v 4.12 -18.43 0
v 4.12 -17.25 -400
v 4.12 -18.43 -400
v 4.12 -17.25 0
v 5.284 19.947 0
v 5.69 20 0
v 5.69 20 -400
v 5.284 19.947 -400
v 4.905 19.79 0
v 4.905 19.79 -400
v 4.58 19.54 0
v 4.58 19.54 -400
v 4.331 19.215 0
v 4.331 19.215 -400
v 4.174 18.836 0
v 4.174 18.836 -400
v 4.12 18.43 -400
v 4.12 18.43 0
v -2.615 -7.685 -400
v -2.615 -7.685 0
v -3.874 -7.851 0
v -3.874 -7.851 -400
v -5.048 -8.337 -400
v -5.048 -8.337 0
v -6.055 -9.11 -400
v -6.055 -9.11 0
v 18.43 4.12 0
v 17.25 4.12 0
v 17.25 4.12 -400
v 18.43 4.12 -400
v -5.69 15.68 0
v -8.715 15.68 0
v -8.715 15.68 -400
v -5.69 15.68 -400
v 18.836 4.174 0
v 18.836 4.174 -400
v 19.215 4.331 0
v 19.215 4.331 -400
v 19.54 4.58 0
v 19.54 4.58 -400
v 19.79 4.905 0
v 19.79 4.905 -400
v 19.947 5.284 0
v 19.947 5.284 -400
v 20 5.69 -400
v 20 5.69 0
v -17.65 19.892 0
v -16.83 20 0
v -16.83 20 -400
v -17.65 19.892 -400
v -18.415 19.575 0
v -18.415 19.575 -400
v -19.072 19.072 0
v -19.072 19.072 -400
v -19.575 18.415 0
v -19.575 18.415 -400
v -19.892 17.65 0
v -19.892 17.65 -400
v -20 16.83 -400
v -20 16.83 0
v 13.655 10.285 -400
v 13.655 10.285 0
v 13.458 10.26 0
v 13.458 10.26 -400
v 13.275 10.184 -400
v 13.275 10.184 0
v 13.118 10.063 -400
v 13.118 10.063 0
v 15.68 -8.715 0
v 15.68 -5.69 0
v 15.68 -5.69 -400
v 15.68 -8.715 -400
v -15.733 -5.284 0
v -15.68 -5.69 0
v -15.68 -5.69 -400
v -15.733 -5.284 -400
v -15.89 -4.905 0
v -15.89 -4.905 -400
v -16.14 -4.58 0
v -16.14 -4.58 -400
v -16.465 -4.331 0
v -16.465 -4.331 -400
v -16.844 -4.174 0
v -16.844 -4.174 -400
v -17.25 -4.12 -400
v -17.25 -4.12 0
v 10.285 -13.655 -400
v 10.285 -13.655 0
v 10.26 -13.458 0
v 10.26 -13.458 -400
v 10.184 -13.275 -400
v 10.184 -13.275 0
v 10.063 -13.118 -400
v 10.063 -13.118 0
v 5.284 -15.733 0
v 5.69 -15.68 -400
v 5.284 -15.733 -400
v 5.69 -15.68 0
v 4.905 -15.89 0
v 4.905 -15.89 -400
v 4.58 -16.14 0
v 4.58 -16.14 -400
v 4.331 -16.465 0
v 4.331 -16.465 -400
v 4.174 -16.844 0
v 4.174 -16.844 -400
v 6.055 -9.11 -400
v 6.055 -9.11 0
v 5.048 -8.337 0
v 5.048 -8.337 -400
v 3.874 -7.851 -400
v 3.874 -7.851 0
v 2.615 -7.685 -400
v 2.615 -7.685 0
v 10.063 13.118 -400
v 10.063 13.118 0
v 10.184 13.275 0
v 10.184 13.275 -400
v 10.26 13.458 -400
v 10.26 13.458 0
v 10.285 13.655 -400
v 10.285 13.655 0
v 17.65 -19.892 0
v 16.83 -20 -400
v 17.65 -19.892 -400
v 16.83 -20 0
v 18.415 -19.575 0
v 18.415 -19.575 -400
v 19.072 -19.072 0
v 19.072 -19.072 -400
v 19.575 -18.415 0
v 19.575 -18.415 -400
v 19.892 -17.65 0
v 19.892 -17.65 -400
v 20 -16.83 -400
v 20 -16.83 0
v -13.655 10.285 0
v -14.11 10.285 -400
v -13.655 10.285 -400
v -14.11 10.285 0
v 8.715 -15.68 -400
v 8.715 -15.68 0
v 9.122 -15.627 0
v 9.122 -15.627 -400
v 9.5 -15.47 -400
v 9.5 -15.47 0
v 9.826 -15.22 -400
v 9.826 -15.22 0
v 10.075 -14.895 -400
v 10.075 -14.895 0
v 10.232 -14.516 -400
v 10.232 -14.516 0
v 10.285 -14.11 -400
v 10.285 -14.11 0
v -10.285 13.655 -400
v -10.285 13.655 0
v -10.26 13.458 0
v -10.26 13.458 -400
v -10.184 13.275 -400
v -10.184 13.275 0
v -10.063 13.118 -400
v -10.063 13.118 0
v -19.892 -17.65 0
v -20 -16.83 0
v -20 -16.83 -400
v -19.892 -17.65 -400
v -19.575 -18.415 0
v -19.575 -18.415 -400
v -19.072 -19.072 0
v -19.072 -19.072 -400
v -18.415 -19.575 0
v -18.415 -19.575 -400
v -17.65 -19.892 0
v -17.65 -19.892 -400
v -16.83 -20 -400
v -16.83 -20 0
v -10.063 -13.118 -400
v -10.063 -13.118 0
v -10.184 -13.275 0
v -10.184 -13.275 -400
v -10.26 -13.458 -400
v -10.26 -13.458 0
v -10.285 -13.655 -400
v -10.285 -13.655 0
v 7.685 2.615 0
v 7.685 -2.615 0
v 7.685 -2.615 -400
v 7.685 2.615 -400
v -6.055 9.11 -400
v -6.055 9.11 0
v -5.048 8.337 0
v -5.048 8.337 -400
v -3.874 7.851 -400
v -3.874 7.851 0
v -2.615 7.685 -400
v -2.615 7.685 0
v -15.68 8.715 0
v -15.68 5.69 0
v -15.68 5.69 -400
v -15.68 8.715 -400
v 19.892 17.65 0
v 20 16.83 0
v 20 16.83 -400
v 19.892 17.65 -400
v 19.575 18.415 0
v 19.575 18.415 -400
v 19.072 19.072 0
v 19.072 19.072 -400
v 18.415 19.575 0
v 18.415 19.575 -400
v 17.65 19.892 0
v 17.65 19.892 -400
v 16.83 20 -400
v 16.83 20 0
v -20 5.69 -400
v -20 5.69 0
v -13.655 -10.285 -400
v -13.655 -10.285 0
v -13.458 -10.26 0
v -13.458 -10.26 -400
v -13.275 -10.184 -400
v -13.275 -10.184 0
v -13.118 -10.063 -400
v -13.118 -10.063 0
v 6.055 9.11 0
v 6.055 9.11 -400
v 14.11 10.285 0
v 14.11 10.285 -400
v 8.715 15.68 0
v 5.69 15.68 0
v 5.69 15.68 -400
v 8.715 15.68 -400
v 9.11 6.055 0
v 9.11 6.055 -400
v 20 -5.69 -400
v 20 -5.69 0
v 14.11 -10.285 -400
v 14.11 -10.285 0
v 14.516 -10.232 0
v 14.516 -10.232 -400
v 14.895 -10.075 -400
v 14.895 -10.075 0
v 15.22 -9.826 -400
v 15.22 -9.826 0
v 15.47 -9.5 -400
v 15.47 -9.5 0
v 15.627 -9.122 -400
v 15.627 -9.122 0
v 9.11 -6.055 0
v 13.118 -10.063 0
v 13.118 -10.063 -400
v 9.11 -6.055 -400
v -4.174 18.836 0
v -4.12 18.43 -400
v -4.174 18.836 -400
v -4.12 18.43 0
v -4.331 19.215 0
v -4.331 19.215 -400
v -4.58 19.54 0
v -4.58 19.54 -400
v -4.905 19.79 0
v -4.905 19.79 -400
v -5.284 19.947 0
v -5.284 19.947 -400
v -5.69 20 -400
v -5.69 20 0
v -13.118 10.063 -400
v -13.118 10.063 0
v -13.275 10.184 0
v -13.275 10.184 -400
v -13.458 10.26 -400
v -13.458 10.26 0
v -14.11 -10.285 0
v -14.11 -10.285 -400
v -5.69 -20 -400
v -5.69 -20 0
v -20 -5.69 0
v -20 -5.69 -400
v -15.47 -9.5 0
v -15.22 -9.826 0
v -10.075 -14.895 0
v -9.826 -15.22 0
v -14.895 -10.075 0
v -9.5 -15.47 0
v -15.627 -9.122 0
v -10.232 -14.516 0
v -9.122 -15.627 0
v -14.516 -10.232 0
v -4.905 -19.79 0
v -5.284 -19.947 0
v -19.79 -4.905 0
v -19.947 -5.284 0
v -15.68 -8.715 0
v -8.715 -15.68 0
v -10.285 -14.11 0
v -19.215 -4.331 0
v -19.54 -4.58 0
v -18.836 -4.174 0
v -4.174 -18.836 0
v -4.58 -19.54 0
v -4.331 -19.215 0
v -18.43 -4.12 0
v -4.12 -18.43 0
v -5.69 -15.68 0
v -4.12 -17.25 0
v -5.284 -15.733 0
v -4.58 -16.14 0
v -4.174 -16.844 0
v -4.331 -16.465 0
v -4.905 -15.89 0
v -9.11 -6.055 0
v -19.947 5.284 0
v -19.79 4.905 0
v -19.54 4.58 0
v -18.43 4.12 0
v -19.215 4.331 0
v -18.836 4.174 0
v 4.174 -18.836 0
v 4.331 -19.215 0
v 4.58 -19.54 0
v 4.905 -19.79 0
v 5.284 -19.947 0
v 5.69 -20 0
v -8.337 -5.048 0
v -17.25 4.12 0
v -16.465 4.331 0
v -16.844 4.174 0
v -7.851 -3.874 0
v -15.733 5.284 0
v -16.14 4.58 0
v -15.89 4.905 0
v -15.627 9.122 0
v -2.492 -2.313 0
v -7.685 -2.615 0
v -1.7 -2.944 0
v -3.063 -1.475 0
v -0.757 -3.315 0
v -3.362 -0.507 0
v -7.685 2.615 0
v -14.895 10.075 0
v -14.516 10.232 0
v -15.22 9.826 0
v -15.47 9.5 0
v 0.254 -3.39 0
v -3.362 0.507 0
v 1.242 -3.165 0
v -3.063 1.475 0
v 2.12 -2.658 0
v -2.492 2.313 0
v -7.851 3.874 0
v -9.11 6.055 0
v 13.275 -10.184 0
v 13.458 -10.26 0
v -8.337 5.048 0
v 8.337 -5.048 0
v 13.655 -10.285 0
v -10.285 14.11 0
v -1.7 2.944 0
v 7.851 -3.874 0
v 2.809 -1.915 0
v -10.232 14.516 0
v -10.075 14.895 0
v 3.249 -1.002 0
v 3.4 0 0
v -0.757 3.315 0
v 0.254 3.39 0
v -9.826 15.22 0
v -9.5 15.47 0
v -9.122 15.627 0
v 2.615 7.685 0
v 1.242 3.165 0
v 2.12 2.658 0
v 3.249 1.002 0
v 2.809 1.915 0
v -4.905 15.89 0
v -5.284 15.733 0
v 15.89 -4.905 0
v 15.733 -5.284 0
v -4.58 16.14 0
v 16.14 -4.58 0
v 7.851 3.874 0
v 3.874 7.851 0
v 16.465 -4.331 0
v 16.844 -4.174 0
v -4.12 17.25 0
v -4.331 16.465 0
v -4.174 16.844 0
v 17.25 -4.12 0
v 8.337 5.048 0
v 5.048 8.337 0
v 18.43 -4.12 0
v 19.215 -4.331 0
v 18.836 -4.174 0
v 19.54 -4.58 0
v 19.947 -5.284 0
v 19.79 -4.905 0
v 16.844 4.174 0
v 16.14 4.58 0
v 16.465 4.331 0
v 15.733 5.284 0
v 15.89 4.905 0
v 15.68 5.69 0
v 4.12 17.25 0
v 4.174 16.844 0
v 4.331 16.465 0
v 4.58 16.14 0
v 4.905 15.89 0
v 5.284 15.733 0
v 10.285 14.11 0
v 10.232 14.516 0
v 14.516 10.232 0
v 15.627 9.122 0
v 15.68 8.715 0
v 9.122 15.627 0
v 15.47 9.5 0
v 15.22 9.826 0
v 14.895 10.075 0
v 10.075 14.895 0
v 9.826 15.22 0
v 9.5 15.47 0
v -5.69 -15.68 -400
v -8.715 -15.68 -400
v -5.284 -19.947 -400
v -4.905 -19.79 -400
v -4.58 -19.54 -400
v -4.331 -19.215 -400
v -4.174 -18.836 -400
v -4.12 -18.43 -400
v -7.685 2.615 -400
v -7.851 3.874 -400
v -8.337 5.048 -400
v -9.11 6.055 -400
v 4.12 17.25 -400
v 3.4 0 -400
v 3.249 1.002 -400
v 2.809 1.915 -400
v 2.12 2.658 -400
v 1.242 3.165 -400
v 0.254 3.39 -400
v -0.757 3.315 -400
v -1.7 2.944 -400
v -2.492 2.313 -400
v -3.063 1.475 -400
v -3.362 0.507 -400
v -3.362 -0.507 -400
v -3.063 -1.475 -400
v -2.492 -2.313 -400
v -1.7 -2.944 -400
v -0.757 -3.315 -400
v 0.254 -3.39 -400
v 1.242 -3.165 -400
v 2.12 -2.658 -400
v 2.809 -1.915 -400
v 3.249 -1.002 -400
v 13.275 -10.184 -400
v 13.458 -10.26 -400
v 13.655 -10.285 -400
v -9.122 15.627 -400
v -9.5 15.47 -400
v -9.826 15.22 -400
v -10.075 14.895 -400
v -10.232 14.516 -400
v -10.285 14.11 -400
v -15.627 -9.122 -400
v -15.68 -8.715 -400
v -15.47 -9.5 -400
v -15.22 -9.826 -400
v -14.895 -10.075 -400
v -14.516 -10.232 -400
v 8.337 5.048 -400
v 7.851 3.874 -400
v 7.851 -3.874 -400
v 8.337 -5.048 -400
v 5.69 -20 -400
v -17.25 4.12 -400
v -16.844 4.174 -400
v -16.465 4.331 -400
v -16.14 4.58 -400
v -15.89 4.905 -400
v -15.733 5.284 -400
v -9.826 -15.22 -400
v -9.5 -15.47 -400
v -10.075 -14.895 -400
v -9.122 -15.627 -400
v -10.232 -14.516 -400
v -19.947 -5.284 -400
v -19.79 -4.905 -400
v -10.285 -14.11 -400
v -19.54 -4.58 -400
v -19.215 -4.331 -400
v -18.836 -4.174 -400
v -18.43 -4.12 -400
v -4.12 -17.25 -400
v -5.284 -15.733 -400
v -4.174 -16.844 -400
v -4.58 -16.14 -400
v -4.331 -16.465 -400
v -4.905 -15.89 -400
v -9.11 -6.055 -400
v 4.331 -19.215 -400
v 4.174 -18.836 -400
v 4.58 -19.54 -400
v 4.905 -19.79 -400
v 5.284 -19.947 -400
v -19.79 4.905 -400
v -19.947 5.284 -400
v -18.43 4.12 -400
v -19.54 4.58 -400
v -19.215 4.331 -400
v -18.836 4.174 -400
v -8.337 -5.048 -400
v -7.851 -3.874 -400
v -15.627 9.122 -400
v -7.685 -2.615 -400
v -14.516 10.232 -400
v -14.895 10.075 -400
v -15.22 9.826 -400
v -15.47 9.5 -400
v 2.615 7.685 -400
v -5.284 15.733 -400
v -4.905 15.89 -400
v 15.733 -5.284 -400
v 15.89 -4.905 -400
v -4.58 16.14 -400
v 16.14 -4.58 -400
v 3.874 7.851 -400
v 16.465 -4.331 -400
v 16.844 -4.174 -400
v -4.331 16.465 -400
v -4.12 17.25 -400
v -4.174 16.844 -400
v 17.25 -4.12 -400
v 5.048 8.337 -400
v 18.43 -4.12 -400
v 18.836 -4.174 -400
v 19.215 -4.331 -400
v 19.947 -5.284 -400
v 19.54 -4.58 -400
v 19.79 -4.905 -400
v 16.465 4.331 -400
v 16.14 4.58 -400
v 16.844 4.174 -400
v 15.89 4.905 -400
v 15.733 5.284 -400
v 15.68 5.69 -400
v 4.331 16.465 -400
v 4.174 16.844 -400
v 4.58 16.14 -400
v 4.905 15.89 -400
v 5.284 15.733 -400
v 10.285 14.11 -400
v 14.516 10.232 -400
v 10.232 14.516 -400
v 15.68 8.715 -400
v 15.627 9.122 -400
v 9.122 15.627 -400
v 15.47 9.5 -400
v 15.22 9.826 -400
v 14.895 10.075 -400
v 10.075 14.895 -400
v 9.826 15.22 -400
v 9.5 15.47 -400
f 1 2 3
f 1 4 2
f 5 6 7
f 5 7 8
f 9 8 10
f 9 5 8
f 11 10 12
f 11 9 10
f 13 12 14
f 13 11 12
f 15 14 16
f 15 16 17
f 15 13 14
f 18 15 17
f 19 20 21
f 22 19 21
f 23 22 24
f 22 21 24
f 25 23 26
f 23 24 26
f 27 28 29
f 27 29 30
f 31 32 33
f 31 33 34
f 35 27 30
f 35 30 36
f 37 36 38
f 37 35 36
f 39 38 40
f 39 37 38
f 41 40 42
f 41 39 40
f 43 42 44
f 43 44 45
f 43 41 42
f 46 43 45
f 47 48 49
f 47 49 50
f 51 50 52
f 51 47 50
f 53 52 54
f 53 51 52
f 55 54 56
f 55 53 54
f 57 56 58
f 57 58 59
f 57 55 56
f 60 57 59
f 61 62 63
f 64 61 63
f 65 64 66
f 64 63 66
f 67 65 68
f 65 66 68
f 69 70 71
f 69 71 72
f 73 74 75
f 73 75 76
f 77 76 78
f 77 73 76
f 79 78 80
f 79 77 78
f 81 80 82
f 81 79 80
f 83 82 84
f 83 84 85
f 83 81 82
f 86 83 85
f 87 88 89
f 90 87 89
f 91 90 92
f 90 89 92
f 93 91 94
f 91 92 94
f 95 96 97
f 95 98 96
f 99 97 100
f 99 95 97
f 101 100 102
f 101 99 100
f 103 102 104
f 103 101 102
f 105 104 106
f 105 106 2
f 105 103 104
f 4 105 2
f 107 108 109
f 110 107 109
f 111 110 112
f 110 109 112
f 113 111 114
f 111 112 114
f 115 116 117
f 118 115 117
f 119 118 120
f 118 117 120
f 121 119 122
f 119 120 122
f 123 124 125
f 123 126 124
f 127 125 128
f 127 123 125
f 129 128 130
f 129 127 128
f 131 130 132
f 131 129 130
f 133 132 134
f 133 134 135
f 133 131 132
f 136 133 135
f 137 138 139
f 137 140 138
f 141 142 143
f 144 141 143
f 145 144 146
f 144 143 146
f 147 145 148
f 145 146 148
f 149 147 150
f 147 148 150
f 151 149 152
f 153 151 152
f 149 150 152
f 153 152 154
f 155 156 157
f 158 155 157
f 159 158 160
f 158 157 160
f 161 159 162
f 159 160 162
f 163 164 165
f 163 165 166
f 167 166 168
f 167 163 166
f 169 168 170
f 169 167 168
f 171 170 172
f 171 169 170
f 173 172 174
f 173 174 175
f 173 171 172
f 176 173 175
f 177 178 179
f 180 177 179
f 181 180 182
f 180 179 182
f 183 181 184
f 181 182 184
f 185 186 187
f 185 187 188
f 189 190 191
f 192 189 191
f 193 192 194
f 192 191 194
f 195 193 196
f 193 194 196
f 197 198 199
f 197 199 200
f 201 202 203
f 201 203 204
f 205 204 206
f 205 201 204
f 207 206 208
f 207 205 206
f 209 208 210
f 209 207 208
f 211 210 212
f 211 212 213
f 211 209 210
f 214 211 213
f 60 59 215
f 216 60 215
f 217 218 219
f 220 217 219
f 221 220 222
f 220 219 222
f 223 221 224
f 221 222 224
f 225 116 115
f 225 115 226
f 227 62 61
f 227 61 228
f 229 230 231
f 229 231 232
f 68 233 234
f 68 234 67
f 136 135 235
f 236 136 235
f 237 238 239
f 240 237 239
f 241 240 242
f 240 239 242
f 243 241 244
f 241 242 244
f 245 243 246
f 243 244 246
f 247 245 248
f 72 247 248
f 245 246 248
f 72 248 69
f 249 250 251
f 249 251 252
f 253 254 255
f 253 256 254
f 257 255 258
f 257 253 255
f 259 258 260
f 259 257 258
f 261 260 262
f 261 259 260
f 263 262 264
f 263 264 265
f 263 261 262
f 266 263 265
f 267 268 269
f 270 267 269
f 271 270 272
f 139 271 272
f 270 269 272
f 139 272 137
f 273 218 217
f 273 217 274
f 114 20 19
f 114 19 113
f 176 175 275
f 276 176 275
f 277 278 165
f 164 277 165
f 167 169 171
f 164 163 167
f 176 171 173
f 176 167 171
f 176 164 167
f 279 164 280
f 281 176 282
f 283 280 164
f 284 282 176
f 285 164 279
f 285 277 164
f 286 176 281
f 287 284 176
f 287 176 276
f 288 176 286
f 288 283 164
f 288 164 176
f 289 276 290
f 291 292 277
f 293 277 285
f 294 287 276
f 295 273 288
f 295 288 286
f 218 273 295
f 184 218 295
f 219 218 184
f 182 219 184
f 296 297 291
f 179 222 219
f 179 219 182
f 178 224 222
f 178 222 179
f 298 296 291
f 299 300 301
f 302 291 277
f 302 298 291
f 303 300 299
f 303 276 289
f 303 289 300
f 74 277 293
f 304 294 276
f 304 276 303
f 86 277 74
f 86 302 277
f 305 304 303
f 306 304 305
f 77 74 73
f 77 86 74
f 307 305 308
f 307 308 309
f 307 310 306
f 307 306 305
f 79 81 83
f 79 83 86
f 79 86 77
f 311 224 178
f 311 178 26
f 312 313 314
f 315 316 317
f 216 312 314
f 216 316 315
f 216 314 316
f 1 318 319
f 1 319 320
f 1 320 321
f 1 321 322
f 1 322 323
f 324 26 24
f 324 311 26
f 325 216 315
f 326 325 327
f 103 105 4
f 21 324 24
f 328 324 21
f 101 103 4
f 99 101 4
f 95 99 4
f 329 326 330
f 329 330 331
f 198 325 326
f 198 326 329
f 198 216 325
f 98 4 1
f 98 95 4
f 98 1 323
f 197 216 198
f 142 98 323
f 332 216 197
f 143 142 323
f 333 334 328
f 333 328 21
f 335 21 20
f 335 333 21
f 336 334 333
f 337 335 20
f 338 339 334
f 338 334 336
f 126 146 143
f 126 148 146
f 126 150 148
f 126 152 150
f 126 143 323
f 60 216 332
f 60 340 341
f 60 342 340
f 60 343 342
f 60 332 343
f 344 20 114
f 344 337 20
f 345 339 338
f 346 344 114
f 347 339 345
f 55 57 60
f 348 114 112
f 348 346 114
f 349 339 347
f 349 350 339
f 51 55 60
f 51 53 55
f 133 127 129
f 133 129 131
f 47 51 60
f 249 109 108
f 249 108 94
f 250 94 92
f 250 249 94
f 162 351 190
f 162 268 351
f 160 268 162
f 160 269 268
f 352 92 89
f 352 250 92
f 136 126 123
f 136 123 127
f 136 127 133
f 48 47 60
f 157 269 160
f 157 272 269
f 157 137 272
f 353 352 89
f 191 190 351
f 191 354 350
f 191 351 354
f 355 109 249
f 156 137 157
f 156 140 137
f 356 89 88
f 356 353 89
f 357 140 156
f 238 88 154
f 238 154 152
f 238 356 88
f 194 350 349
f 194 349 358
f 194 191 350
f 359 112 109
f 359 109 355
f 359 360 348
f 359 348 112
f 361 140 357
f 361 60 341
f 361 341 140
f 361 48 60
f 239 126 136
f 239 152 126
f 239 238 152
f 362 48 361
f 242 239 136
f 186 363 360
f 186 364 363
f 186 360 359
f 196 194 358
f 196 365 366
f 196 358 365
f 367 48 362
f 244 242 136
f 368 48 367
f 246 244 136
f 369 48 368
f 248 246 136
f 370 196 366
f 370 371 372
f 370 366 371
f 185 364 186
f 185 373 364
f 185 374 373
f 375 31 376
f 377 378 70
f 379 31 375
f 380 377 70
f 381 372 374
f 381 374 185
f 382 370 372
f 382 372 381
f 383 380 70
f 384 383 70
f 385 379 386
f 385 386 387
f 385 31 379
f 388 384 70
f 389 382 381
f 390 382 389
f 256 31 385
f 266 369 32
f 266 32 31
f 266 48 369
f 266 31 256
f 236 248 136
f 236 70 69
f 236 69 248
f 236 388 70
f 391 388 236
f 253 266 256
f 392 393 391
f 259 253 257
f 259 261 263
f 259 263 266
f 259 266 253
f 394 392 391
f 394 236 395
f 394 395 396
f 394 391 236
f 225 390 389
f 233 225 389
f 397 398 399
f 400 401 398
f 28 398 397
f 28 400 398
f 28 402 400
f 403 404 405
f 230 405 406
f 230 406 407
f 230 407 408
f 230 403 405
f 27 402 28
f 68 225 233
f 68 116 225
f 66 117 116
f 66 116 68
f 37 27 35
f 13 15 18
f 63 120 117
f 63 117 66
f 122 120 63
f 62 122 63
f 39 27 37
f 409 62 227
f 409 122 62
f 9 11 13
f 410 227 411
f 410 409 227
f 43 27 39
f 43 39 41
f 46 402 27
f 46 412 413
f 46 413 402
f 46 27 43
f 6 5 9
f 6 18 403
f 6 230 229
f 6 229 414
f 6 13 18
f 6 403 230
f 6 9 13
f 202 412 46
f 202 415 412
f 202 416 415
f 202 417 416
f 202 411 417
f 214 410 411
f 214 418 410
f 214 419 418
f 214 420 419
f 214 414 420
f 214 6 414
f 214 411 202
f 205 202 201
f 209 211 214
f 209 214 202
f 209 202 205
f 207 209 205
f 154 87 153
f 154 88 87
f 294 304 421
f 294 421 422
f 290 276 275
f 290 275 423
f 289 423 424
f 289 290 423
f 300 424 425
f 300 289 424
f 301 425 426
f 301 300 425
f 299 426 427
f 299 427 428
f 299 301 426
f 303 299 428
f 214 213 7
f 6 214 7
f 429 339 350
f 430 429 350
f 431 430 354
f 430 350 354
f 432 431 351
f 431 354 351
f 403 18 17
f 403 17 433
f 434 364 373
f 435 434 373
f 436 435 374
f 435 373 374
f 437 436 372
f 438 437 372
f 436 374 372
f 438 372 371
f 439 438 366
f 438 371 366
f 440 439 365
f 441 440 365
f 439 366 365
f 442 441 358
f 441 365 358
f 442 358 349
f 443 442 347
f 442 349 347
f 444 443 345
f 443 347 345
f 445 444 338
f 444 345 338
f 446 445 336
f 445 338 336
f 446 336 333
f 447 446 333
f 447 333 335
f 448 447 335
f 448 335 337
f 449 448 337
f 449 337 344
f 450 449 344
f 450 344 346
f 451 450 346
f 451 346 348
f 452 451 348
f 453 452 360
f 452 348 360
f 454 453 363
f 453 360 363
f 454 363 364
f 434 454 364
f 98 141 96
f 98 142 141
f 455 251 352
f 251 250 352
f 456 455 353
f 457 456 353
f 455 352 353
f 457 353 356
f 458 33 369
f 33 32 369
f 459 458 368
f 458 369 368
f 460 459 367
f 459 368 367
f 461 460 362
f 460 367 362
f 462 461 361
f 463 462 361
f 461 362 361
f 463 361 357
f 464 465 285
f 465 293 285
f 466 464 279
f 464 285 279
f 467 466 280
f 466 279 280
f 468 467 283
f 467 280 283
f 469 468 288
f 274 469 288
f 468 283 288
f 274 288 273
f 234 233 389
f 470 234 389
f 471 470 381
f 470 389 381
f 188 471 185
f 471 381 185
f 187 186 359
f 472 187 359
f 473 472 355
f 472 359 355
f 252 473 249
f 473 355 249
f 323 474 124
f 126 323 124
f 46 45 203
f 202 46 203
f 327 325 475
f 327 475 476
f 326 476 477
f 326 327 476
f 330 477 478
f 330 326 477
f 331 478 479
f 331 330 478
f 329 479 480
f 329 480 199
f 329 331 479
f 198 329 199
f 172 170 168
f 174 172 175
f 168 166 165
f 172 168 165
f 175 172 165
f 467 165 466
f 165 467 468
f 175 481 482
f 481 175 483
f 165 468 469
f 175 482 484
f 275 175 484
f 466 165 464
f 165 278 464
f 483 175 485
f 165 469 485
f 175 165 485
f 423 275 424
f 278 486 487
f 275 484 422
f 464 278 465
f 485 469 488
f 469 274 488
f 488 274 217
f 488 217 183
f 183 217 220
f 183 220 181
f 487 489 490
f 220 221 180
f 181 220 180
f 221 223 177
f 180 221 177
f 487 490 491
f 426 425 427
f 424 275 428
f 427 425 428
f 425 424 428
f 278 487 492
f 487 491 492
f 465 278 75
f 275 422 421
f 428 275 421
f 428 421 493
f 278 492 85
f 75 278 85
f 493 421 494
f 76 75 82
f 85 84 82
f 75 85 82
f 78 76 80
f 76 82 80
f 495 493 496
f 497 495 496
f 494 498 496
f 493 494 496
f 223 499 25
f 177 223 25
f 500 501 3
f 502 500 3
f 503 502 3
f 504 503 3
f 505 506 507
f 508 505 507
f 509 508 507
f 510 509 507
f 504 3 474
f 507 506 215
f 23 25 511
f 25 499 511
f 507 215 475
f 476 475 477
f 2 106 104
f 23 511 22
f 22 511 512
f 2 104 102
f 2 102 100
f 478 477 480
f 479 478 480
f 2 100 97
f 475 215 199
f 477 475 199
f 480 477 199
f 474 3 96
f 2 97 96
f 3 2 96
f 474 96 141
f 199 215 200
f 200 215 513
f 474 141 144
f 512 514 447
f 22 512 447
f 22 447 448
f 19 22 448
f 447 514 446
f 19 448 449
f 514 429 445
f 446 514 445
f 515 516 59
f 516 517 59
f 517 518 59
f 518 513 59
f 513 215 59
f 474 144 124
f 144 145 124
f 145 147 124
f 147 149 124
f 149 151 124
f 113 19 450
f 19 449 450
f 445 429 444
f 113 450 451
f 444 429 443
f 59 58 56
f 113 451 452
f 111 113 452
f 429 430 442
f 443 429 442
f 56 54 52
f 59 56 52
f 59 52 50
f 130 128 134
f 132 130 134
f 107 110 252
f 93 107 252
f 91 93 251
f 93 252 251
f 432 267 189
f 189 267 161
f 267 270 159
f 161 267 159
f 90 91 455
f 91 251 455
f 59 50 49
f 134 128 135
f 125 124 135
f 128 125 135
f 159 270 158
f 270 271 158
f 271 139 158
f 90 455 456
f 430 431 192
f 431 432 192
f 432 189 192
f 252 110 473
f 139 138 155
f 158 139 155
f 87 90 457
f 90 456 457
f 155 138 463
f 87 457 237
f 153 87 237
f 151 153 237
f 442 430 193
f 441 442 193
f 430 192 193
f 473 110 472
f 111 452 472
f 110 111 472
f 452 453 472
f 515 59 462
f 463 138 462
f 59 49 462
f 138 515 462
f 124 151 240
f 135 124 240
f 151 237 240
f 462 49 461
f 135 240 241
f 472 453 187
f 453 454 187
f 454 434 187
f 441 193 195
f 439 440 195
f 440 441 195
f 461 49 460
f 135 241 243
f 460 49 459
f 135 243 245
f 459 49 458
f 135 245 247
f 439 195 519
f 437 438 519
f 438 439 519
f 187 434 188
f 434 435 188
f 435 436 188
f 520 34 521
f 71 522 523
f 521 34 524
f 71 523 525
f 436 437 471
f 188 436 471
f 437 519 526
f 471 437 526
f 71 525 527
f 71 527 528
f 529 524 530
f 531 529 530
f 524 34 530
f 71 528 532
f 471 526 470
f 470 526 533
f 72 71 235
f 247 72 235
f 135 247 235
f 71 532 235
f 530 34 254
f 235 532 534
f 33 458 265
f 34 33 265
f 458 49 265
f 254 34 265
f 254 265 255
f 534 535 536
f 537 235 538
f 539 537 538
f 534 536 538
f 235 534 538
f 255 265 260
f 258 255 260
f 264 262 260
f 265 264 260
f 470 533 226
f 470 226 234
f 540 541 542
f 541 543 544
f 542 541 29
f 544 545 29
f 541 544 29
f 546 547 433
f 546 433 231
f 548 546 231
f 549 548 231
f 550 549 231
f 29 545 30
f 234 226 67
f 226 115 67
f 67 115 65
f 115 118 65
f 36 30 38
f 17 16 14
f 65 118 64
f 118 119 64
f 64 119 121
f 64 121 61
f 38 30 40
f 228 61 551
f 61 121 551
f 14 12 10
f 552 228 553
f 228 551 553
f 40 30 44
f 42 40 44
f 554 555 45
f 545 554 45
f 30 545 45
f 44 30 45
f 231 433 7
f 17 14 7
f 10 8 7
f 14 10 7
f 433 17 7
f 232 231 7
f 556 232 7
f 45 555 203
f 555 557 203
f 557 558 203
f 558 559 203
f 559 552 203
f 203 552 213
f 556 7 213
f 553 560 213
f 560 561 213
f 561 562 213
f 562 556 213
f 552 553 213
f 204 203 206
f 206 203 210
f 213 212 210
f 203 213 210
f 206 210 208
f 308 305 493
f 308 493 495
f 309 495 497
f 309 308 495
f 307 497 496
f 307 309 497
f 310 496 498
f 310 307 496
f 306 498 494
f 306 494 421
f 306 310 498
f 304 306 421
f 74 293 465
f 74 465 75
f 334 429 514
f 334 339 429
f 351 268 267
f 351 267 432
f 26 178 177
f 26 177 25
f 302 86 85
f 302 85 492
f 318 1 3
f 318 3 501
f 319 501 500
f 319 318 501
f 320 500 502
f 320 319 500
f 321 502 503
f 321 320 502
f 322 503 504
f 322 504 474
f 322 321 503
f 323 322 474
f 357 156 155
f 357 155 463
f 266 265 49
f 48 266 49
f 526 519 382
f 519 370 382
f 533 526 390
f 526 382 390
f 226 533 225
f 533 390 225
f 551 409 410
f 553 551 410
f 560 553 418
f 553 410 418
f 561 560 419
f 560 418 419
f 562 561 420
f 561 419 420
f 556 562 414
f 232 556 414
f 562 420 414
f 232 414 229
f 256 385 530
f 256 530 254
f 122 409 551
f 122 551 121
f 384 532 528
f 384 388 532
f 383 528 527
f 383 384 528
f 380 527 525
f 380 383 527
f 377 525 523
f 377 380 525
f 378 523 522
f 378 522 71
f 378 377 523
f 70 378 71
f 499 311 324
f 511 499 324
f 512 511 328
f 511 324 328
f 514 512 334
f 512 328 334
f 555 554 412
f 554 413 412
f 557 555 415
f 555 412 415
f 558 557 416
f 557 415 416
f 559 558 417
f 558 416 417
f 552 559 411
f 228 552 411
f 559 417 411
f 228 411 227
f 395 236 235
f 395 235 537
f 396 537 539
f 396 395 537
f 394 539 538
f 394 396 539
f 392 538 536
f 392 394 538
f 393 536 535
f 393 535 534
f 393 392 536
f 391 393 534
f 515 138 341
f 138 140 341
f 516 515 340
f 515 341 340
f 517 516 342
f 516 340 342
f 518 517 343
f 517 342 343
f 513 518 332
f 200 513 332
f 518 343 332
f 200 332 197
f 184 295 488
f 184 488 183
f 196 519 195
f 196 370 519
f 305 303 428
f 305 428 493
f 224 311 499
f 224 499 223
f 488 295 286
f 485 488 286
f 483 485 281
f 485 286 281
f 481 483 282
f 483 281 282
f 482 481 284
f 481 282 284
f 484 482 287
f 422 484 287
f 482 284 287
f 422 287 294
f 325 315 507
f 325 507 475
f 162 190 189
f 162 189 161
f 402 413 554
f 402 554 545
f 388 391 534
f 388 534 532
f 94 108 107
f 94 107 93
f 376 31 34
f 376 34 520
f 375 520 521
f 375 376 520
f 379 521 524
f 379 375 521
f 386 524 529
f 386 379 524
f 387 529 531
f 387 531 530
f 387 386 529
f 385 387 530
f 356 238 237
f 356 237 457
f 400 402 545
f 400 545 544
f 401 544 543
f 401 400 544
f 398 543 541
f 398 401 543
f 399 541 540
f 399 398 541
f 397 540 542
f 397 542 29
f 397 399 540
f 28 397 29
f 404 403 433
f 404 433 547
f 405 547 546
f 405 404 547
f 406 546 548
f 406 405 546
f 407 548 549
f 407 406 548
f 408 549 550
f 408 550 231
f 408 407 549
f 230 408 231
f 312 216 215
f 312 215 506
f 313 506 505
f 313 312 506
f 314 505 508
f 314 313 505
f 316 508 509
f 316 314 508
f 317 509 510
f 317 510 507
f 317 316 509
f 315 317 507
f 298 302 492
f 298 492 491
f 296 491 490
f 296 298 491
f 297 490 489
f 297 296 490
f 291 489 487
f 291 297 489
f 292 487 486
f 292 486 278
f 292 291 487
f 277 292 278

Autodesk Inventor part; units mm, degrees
sketch "Sketch_1" plane through (0, 0, 0) normal (0, 0, 1) x (1, 0, 0)
  line L0 (-20, 16.83) -> (-20, 5.6904)
  arc A0 (-20, 5.6904) -> (-18.43, 4.1204) centre (-18.43, 5.6904) ccw
  line L1 (-18.43, 4.1204) -> (-17.25, 4.1204)
  arc A1 (-17.25, 4.1204) -> (-15.68, 5.6904) centre (-17.25, 5.6904) ccw
  line L2 (-15.68, 5.6904) -> (-15.68, 8.7154)
  arc A2 (-14.11, 10.2854) -> (-15.68, 8.7154) centre (-14.11, 8.7154) ccw
  line L3 (-14.11, 10.2854) -> (-13.6549, 10.2854)
  arc A3 (-13.1175, 10.0628) -> (-13.6549, 10.2854) centre (-13.6549, 9.5254) ccw
  line L4 (-13.1175, 10.0628) -> (-9.1098, 6.0551)
  arc A4 (-7.685, 2.6153) -> (-9.1098, 6.0551) centre (-12.5496, 2.6153) ccw
  line L5 (-7.685, 2.6153) -> (-7.685, -2.6153)
  arc A5 (-9.1098, -6.0551) -> (-7.685, -2.6153) centre (-12.5496, -2.6153) ccw
  line L6 (-9.1098, -6.0551) -> (-13.1175, -10.0628)
  arc A6 (-13.6549, -10.2854) -> (-13.1175, -10.0628) centre (-13.6549, -9.5254) ccw
  line L7 (-13.6549, -10.2854) -> (-14.11, -10.2854)
  arc A7 (-15.68, -8.7154) -> (-14.11, -10.2854) centre (-14.11, -8.7154) ccw
  line L8 (-15.68, -8.7154) -> (-15.68, -5.6904)
  arc A8 (-15.68, -5.6904) -> (-17.25, -4.1204) centre (-17.25, -5.6904) ccw
  line L9 (-17.25, -4.1204) -> (-18.43, -4.1204)
  arc A9 (-18.43, -4.1204) -> (-20, -5.6904) centre (-18.43, -5.6904) ccw
  line L10 (-20, -5.6904) -> (-20, -16.83)
  arc A10 (-20, -16.83) -> (-16.83, -20) centre (-16.83, -16.83) ccw
  line L11 (-16.83, -20) -> (-5.6904, -20)
  arc A11 (-5.6904, -20) -> (-4.1204, -18.43) centre (-5.6904, -18.43) ccw
  line L12 (-4.1204, -18.43) -> (-4.1204, -17.25)
  arc A12 (-4.1204, -17.25) -> (-5.6904, -15.68) centre (-5.6904, -17.25) ccw
  line L13 (-5.6904, -15.68) -> (-8.7154, -15.68)
  arc A13 (-10.2854, -14.11) -> (-8.7154, -15.68) centre (-8.7154, -14.11) ccw
  line L14 (-10.2854, -14.11) -> (-10.2854, -13.6549)
  arc A14 (-10.0628, -13.1175) -> (-10.2854, -13.6549) centre (-9.5254, -13.6549) ccw
  line L15 (-10.0628, -13.1175) -> (-6.0551, -9.1098)
  arc A15 (-2.6153, -7.685) -> (-6.0551, -9.1098) centre (-2.6153, -12.5496) ccw
  line L16 (-2.6153, -7.685) -> (2.6153, -7.685)
  arc A16 (6.0551, -9.1098) -> (2.6153, -7.685) centre (2.6153, -12.5496) ccw
  line L17 (6.0551, -9.1098) -> (10.0628, -13.1175)
  arc A17 (10.2854, -13.6549) -> (10.0628, -13.1175) centre (9.5254, -13.6549) ccw
  line L18 (10.2854, -13.6549) -> (10.2854, -14.11)
  arc A18 (8.7154, -15.68) -> (10.2854, -14.11) centre (8.7154, -14.11) ccw
  line L19 (8.7154, -15.68) -> (5.6904, -15.68)
  arc A19 (5.6904, -15.68) -> (4.1204, -17.25) centre (5.6904, -17.25) ccw
  line L20 (4.1204, -17.25) -> (4.1204, -18.43)
  arc A20 (4.1204, -18.43) -> (5.6904, -20) centre (5.6904, -18.43) ccw
  line L21 (5.6904, -20) -> (16.83, -20)
  arc A21 (16.83, -20) -> (20, -16.83) centre (16.83, -16.83) ccw
  line L22 (20, -16.83) -> (20, -5.6904)
  arc A22 (20, -5.6904) -> (18.43, -4.1204) centre (18.43, -5.6904) ccw
  line L23 (18.43, -4.1204) -> (17.25, -4.1204)
  arc A23 (17.25, -4.1204) -> (15.68, -5.6904) centre (17.25, -5.6904) ccw
  line L24 (15.68, -5.6904) -> (15.68, -8.7154)
  arc A24 (14.11, -10.2854) -> (15.68, -8.7154) centre (14.11, -8.7154) ccw
  line L25 (14.11, -10.2854) -> (13.6549, -10.2854)
  arc A25 (13.1175, -10.0628) -> (13.6549, -10.2854) centre (13.6549, -9.5254) ccw
  line L26 (13.1175, -10.0628) -> (9.1098, -6.0551)
  arc A26 (7.685, -2.6153) -> (9.1098, -6.0551) centre (12.5496, -2.6153) ccw
  line L27 (7.685, -2.6153) -> (7.685, 2.6153)
  arc A27 (9.1098, 6.0551) -> (7.685, 2.6153) centre (12.5496, 2.6153) ccw
  line L28 (9.1098, 6.0551) -> (13.1175, 10.0628)
  arc A28 (13.6549, 10.2854) -> (13.1175, 10.0628) centre (13.6549, 9.5254) ccw
  line L29 (13.6549, 10.2854) -> (14.11, 10.2854)
  arc A29 (15.68, 8.7154) -> (14.11, 10.2854) centre (14.11, 8.7154) ccw
  line L30 (15.68, 8.7154) -> (15.68, 5.6904)
  arc A30 (15.68, 5.6904) -> (17.25, 4.1204) centre (17.25, 5.6904) ccw
  line L31 (17.25, 4.1204) -> (18.43, 4.1204)
  arc A31 (18.43, 4.1204) -> (20, 5.6904) centre (18.43, 5.6904) ccw
  line L32 (20, 5.6904) -> (20, 16.83)
  arc A32 (20, 16.83) -> (16.83, 20) centre (16.83, 16.83) ccw
  line L33 (16.83, 20) -> (5.6904, 20)
  arc A33 (5.6904, 20) -> (4.1204, 18.43) centre (5.6904, 18.43) ccw
  line L34 (4.1204, 18.43) -> (4.1204, 17.25)
  arc A34 (4.1204, 17.25) -> (5.6904, 15.68) centre (5.6904, 17.25) ccw
  line L35 (5.6904, 15.68) -> (8.7154, 15.68)
  arc A35 (10.2854, 14.11) -> (8.7154, 15.68) centre (8.7154, 14.11) ccw
  line L36 (10.2854, 14.11) -> (10.2854, 13.6549)
  arc A36 (10.0628, 13.1175) -> (10.2854, 13.6549) centre (9.5254, 13.6549) ccw
  line L37 (10.0628, 13.1175) -> (6.0551, 9.1098)
  arc A37 (2.6153, 7.685) -> (6.0551, 9.1098) centre (2.6153, 12.5496) ccw
  line L38 (2.6153, 7.685) -> (-2.6153, 7.685)
  arc A38 (-6.0551, 9.1098) -> (-2.6153, 7.685) centre (-2.6153, 12.5496) ccw
  line L39 (-6.0551, 9.1098) -> (-10.0628, 13.1175)
  arc A39 (-10.2854, 13.6549) -> (-10.0628, 13.1175) centre (-9.5254, 13.6549) ccw
  line L40 (-10.2854, 13.6549) -> (-10.2854, 14.11)
  arc A40 (-8.7154, 15.68) -> (-10.2854, 14.11) centre (-8.7154, 14.11) ccw
  line L41 (-8.7154, 15.68) -> (-5.6904, 15.68)
  arc A41 (-5.6904, 15.68) -> (-4.1204, 17.25) centre (-5.6904, 17.25) ccw
  line L42 (-4.1204, 17.25) -> (-4.1204, 18.43)
  arc A42 (-4.1204, 18.43) -> (-5.6904, 20) centre (-5.6904, 18.43) ccw
  line L43 (-5.6904, 20) -> (-16.83, 20)
  arc A43 (-16.83, 20) -> (-20, 16.83) centre (-16.83, 16.83) ccw
  circle A44 centre (0, 0) radius 3.4
extrude "Extrusion1" add sketch "Sketch_1" against normal blind 400
ref_plane "to_parts_XY" through (0, 0, -200) normal (0, 0, 1) x (1, 0, 0)
ref_plane "to_parts_YZ" through (0, 0, -200) normal (1, 0, 0) x (0, 1, 0)
ref_plane "to_parts_ZX" through (0, 0, -200) normal (0, 1, 0) x (0, 0, 1)
properties part number "40-4040-400-CL"
